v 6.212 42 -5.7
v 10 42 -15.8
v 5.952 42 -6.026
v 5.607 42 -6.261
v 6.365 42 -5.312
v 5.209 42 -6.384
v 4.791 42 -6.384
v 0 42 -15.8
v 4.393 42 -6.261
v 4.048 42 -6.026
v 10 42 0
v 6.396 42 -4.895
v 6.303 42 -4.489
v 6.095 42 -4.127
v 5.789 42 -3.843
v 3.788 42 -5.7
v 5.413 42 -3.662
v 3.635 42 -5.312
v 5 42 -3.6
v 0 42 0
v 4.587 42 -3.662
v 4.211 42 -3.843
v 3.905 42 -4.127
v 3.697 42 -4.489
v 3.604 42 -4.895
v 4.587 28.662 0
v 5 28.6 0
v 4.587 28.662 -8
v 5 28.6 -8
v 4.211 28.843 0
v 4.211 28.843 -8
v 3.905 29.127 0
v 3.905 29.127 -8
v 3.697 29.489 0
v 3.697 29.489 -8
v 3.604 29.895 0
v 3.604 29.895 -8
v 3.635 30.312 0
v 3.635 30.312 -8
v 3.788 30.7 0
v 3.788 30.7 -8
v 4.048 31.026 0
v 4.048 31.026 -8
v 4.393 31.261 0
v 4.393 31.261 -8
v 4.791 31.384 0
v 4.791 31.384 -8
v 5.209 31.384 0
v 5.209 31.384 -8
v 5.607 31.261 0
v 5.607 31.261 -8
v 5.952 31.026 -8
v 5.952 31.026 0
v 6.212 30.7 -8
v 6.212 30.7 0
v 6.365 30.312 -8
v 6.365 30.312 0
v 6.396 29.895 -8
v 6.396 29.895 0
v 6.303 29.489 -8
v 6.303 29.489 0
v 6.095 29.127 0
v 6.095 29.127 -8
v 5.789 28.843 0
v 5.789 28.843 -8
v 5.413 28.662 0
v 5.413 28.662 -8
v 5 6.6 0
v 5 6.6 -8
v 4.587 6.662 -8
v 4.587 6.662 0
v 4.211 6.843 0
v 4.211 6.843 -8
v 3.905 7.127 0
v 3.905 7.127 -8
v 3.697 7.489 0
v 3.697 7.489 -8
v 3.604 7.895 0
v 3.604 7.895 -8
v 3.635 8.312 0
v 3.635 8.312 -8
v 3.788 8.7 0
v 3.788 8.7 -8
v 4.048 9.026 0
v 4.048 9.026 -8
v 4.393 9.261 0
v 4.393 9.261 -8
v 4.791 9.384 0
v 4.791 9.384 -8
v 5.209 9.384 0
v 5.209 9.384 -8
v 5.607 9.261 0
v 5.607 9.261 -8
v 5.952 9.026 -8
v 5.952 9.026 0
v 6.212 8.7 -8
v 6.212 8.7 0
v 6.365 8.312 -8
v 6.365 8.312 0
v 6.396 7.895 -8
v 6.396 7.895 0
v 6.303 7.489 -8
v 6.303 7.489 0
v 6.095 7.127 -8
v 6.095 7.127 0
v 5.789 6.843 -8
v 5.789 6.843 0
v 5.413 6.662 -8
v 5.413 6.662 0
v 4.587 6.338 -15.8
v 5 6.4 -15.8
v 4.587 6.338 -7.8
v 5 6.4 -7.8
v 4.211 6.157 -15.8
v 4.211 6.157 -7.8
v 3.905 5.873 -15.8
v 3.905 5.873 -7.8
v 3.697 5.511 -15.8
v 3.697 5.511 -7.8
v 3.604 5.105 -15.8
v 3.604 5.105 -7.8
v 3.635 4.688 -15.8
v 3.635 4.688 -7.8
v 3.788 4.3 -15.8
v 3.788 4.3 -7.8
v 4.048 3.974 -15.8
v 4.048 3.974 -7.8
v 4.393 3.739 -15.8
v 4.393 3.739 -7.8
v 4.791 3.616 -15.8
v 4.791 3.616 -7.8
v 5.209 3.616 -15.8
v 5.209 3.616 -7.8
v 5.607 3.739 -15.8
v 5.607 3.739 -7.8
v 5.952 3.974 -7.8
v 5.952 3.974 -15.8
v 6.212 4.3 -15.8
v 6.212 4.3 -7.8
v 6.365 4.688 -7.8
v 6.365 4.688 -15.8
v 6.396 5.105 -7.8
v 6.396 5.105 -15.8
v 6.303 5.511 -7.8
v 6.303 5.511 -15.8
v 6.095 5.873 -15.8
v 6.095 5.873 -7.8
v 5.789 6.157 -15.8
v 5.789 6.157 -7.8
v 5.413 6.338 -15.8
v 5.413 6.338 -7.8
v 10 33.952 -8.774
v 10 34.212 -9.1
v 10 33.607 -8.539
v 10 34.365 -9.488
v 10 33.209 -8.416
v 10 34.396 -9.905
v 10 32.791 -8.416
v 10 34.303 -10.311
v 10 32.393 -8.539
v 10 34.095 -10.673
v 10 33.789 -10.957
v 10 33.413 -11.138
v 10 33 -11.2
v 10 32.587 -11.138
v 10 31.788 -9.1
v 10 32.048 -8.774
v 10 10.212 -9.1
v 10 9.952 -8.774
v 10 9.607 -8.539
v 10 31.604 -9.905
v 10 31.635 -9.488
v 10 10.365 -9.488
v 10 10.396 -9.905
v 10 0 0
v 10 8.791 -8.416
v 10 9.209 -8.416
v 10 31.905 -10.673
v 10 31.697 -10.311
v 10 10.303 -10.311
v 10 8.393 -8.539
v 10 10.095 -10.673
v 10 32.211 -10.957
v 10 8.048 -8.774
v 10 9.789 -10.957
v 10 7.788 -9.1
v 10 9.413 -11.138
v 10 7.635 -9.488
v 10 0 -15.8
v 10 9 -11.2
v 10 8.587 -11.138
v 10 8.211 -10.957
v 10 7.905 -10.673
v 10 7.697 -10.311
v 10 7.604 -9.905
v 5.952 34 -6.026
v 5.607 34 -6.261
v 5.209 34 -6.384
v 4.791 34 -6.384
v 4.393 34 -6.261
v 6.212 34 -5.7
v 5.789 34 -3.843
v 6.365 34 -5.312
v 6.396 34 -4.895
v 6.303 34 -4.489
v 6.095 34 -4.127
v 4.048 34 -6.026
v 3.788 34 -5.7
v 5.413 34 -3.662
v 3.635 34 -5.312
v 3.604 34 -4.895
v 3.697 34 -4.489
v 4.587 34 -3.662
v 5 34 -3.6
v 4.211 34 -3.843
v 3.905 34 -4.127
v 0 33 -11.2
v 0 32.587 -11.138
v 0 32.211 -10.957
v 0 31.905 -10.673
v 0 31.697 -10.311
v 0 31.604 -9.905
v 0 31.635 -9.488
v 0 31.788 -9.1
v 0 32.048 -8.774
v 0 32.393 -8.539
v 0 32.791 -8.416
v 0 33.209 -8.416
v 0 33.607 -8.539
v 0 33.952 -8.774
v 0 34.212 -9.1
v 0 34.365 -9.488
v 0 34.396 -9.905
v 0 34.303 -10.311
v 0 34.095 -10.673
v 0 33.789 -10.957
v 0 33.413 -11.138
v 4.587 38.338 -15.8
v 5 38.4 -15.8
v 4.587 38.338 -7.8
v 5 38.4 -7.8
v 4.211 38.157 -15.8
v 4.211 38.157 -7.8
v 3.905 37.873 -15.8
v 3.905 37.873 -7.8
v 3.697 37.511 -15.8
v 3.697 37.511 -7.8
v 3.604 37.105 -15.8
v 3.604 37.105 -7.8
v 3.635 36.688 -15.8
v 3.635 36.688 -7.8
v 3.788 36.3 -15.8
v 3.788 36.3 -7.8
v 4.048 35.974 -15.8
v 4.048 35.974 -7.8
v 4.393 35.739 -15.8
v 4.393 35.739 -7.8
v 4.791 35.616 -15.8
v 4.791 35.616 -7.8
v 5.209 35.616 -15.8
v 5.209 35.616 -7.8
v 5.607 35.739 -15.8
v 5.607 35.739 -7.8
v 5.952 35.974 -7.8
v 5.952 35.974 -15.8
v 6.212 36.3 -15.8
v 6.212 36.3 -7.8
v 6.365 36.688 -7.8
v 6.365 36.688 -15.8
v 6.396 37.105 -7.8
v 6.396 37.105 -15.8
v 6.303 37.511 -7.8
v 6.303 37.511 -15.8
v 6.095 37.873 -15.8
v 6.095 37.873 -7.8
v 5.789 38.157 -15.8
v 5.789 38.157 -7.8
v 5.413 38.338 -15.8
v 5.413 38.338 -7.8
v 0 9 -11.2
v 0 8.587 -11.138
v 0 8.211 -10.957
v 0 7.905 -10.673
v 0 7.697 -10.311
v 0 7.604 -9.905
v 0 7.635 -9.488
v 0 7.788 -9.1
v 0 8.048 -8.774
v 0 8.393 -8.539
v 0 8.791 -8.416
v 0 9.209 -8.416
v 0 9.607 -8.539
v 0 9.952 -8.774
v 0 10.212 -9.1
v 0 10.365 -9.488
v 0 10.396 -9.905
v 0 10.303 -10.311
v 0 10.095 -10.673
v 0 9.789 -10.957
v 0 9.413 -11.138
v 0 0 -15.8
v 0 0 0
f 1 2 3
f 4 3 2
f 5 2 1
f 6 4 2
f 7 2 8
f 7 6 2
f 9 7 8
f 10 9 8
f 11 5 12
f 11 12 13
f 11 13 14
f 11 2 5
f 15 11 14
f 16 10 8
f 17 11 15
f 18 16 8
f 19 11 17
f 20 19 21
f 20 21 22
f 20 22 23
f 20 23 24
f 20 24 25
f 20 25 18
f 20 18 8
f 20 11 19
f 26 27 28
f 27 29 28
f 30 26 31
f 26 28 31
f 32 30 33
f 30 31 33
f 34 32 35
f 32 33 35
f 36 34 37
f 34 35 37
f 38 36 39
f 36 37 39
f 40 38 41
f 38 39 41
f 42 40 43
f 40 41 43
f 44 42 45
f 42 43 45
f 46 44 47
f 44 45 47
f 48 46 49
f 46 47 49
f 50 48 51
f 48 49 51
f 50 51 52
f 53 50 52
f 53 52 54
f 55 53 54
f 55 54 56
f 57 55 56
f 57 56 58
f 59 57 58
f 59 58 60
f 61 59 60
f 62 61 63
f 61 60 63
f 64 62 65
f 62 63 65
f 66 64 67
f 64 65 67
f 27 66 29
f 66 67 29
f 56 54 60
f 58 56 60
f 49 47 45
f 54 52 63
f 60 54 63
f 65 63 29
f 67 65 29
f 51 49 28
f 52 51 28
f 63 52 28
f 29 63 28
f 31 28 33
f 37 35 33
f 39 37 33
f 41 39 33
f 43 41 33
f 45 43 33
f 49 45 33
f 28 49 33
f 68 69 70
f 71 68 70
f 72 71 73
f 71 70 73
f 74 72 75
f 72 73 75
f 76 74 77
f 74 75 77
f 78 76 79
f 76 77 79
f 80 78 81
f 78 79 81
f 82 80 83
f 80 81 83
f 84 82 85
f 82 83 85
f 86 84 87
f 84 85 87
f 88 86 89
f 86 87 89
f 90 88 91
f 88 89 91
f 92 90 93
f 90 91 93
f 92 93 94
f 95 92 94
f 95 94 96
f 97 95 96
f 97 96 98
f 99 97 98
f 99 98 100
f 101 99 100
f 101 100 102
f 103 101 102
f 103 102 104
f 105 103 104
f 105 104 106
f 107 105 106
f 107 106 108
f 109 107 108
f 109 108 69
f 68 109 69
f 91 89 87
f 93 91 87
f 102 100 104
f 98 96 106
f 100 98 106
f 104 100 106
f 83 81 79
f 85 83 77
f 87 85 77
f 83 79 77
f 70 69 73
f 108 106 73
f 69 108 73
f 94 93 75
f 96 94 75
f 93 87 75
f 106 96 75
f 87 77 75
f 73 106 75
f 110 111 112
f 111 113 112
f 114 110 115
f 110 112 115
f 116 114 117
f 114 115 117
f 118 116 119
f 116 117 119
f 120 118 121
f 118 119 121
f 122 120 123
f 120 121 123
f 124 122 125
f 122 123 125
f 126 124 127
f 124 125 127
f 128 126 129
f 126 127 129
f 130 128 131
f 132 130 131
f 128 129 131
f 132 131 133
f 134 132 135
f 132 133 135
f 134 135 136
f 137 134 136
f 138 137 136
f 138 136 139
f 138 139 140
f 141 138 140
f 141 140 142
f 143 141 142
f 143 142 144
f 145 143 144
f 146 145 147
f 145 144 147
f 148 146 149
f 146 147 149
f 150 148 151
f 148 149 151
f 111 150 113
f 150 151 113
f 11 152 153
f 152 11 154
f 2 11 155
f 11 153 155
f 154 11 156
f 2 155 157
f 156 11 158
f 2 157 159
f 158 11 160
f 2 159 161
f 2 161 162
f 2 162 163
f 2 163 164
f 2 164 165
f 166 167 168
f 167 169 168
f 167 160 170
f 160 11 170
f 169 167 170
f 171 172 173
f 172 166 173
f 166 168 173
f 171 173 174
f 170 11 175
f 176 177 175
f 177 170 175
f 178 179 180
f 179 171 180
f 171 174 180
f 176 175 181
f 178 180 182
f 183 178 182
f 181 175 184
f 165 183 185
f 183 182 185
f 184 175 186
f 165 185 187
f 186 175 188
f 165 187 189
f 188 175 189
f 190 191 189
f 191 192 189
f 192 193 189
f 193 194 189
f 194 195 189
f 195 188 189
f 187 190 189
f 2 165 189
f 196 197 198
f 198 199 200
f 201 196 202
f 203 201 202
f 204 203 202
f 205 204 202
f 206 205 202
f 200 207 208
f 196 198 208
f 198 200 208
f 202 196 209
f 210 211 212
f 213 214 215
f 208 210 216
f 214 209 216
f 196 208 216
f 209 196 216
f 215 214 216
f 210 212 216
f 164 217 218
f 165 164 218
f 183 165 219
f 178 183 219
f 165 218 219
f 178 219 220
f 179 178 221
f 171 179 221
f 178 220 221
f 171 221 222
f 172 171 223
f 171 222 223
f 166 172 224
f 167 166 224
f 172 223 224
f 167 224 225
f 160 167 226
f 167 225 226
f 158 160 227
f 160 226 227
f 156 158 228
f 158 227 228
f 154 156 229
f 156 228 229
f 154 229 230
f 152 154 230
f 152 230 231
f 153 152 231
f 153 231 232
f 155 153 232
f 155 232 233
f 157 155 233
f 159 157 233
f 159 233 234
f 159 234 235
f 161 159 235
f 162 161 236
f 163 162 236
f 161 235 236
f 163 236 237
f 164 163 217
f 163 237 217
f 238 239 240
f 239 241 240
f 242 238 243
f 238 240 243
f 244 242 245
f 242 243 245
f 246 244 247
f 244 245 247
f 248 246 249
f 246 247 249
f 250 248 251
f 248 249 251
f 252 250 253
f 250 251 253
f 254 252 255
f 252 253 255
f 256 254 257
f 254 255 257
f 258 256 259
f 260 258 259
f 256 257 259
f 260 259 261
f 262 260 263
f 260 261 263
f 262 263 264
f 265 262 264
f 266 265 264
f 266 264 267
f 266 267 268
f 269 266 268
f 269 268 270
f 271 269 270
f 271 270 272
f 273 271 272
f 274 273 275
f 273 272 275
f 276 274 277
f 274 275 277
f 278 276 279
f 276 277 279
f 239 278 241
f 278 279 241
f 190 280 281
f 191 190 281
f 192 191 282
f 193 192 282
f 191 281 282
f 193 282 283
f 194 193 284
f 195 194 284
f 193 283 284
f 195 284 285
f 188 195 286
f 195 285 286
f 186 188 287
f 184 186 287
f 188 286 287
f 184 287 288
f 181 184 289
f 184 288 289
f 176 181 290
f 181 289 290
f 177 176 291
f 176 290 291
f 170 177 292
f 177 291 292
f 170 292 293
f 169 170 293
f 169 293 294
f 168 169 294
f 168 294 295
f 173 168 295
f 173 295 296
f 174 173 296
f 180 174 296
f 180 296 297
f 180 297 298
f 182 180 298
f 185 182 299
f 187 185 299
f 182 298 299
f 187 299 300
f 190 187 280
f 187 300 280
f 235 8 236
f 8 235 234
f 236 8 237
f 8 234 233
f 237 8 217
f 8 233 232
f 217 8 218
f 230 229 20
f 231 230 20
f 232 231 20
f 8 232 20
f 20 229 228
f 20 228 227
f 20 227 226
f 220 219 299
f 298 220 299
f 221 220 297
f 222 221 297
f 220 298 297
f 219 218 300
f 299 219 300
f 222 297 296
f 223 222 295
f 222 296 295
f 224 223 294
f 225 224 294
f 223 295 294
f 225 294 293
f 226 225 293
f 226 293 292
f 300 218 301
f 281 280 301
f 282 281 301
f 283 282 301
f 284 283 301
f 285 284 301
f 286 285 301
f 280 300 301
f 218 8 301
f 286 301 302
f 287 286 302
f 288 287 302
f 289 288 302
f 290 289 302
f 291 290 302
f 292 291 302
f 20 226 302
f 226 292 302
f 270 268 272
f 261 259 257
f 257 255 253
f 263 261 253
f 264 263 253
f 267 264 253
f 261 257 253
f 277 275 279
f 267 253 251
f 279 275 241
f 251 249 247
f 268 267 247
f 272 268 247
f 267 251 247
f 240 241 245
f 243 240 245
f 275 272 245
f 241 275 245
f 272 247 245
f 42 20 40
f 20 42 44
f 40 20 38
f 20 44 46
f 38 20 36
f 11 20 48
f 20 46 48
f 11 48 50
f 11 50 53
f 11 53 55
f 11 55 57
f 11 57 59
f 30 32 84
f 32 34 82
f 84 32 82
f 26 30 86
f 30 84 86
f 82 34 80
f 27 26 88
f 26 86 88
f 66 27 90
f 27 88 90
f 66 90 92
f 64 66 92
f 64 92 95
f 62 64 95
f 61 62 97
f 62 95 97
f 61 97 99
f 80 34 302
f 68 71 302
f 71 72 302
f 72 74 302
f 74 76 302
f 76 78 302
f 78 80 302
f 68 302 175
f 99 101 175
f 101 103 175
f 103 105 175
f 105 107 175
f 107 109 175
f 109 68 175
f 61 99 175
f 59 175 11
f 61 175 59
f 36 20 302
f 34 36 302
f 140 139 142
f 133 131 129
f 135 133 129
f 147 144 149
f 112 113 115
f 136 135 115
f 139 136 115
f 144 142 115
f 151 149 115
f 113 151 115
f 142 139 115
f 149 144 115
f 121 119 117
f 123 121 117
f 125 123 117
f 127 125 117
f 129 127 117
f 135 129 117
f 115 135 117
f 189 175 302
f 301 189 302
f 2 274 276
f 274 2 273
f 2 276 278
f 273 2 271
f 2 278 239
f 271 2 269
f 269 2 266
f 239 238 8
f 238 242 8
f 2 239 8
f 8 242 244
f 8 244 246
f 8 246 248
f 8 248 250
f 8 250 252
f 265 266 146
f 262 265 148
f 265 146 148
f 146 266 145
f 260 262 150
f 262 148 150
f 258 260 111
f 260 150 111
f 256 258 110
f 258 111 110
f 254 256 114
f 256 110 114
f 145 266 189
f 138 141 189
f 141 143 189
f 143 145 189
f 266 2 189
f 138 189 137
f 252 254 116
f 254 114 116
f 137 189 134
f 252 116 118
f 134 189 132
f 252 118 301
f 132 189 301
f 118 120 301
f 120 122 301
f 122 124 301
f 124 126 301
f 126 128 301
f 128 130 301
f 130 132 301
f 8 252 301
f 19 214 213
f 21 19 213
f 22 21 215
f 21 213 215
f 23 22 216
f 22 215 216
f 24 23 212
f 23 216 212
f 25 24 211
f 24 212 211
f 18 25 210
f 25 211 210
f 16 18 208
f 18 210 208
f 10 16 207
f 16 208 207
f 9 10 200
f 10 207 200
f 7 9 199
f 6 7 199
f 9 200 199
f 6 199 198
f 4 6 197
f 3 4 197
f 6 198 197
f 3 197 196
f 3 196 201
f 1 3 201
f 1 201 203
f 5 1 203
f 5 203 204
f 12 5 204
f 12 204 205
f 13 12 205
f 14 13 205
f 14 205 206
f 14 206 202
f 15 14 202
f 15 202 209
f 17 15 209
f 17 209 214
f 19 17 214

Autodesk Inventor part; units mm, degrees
ref_plane "YZ Plane" through (0, 0, 0) normal (1, 0, 0) x (0, 1, 0)
ref_plane "XZ Plane" through (0, 0, 0) normal (0, 1, 0) x (-1, 0, 0)
ref_plane "XY Plane" through (0, 0, 0) normal (0, 0, 1) x (1, 0, 0)
sketch "Эскиз1" plane through (0, 0, 0) normal (0, 1, 0) x (-1, 0, 0)
  line L0 (0, 0) -> (-10, 0)
  line L1 (-10, 0) -> (-10, -15.8)
  line L2 (-10, -15.8) -> (0, -15.8)
  line L3 (0, -15.8) -> (0, 0)
  dimension "d0" = 10
  dimension "d1" = 15.8
extrude "Выдавливание1" add sketch "Эскиз1" along normal blind 42
sketch "Эскиз2" plane through (10, 0, -15.8) normal (0, 0, -1) x (-1, 0, 0)
  line L0 (0, 0) -> (10, 0) projected
  line L1 (0, 42) -> (10, 42) projected
  point P0 (5, 5)
  point P1 (5, 37)
  point P2 (5, 0)
  dimension "d32" = 5
  dimension "d33" = 5
hole "Отверстие1" at (5, 5, -15.8) at (5, 37, -15.8) direction (0, 0, 1) diameter 2.8 depth 8
sketch "Эскиз3" plane through (10, 0, 0) normal (1, 0, 0) x (0, 0, -1)
  line L0 (0, 42) -> (15.8, 42) projected
  line L1 (0, 0) -> (15.8, 0) projected
  line L2 (15.8, 0) -> (15.8, 42) projected
  point P0 (9.8, 33)
  point P1 (9.8, 9)
  point P2 (7.9, 42)
  dimension "d34" = 9
  dimension "d35" = 9
  dimension "d37" = 6
hole "Отверстие2" at (10, 33, -9.8) at (10, 9, -9.8) direction (-1, 0, 0) diameter 2.8 end through all
sketch "Эскиз7" plane through (0, 42, 0) normal (0, 1, 0) x (1, 0, 0)
  line L0 (0, 0) -> (10, 0) projected
  point P0 (5, 5)
  point P1 (5, 0)
  dimension "d45" = 5
hole "Отверстие5" at (5, 42, -5) direction (0, -1, 0) diameter 2.8 depth 8
sketch "Эскиз9" plane through (0, 0, 0) normal (0, 0, 1) x (1, 0, 0)
  line L0 (0, 42) -> (10, 42) projected
  line L1 (0, 0) -> (10, 0) projected
  point P0 (5, 30)
  point P1 (5, 8)
  point P2 (5, 42)
  dimension "d53" = 12
  dimension "d54" = 8
hole "Отверстие6" at (5, 30, 0) at (5, 8, 0) direction (0, 0, -1) diameter 2.8 depth 8
properties part number "CupHolderBack"
